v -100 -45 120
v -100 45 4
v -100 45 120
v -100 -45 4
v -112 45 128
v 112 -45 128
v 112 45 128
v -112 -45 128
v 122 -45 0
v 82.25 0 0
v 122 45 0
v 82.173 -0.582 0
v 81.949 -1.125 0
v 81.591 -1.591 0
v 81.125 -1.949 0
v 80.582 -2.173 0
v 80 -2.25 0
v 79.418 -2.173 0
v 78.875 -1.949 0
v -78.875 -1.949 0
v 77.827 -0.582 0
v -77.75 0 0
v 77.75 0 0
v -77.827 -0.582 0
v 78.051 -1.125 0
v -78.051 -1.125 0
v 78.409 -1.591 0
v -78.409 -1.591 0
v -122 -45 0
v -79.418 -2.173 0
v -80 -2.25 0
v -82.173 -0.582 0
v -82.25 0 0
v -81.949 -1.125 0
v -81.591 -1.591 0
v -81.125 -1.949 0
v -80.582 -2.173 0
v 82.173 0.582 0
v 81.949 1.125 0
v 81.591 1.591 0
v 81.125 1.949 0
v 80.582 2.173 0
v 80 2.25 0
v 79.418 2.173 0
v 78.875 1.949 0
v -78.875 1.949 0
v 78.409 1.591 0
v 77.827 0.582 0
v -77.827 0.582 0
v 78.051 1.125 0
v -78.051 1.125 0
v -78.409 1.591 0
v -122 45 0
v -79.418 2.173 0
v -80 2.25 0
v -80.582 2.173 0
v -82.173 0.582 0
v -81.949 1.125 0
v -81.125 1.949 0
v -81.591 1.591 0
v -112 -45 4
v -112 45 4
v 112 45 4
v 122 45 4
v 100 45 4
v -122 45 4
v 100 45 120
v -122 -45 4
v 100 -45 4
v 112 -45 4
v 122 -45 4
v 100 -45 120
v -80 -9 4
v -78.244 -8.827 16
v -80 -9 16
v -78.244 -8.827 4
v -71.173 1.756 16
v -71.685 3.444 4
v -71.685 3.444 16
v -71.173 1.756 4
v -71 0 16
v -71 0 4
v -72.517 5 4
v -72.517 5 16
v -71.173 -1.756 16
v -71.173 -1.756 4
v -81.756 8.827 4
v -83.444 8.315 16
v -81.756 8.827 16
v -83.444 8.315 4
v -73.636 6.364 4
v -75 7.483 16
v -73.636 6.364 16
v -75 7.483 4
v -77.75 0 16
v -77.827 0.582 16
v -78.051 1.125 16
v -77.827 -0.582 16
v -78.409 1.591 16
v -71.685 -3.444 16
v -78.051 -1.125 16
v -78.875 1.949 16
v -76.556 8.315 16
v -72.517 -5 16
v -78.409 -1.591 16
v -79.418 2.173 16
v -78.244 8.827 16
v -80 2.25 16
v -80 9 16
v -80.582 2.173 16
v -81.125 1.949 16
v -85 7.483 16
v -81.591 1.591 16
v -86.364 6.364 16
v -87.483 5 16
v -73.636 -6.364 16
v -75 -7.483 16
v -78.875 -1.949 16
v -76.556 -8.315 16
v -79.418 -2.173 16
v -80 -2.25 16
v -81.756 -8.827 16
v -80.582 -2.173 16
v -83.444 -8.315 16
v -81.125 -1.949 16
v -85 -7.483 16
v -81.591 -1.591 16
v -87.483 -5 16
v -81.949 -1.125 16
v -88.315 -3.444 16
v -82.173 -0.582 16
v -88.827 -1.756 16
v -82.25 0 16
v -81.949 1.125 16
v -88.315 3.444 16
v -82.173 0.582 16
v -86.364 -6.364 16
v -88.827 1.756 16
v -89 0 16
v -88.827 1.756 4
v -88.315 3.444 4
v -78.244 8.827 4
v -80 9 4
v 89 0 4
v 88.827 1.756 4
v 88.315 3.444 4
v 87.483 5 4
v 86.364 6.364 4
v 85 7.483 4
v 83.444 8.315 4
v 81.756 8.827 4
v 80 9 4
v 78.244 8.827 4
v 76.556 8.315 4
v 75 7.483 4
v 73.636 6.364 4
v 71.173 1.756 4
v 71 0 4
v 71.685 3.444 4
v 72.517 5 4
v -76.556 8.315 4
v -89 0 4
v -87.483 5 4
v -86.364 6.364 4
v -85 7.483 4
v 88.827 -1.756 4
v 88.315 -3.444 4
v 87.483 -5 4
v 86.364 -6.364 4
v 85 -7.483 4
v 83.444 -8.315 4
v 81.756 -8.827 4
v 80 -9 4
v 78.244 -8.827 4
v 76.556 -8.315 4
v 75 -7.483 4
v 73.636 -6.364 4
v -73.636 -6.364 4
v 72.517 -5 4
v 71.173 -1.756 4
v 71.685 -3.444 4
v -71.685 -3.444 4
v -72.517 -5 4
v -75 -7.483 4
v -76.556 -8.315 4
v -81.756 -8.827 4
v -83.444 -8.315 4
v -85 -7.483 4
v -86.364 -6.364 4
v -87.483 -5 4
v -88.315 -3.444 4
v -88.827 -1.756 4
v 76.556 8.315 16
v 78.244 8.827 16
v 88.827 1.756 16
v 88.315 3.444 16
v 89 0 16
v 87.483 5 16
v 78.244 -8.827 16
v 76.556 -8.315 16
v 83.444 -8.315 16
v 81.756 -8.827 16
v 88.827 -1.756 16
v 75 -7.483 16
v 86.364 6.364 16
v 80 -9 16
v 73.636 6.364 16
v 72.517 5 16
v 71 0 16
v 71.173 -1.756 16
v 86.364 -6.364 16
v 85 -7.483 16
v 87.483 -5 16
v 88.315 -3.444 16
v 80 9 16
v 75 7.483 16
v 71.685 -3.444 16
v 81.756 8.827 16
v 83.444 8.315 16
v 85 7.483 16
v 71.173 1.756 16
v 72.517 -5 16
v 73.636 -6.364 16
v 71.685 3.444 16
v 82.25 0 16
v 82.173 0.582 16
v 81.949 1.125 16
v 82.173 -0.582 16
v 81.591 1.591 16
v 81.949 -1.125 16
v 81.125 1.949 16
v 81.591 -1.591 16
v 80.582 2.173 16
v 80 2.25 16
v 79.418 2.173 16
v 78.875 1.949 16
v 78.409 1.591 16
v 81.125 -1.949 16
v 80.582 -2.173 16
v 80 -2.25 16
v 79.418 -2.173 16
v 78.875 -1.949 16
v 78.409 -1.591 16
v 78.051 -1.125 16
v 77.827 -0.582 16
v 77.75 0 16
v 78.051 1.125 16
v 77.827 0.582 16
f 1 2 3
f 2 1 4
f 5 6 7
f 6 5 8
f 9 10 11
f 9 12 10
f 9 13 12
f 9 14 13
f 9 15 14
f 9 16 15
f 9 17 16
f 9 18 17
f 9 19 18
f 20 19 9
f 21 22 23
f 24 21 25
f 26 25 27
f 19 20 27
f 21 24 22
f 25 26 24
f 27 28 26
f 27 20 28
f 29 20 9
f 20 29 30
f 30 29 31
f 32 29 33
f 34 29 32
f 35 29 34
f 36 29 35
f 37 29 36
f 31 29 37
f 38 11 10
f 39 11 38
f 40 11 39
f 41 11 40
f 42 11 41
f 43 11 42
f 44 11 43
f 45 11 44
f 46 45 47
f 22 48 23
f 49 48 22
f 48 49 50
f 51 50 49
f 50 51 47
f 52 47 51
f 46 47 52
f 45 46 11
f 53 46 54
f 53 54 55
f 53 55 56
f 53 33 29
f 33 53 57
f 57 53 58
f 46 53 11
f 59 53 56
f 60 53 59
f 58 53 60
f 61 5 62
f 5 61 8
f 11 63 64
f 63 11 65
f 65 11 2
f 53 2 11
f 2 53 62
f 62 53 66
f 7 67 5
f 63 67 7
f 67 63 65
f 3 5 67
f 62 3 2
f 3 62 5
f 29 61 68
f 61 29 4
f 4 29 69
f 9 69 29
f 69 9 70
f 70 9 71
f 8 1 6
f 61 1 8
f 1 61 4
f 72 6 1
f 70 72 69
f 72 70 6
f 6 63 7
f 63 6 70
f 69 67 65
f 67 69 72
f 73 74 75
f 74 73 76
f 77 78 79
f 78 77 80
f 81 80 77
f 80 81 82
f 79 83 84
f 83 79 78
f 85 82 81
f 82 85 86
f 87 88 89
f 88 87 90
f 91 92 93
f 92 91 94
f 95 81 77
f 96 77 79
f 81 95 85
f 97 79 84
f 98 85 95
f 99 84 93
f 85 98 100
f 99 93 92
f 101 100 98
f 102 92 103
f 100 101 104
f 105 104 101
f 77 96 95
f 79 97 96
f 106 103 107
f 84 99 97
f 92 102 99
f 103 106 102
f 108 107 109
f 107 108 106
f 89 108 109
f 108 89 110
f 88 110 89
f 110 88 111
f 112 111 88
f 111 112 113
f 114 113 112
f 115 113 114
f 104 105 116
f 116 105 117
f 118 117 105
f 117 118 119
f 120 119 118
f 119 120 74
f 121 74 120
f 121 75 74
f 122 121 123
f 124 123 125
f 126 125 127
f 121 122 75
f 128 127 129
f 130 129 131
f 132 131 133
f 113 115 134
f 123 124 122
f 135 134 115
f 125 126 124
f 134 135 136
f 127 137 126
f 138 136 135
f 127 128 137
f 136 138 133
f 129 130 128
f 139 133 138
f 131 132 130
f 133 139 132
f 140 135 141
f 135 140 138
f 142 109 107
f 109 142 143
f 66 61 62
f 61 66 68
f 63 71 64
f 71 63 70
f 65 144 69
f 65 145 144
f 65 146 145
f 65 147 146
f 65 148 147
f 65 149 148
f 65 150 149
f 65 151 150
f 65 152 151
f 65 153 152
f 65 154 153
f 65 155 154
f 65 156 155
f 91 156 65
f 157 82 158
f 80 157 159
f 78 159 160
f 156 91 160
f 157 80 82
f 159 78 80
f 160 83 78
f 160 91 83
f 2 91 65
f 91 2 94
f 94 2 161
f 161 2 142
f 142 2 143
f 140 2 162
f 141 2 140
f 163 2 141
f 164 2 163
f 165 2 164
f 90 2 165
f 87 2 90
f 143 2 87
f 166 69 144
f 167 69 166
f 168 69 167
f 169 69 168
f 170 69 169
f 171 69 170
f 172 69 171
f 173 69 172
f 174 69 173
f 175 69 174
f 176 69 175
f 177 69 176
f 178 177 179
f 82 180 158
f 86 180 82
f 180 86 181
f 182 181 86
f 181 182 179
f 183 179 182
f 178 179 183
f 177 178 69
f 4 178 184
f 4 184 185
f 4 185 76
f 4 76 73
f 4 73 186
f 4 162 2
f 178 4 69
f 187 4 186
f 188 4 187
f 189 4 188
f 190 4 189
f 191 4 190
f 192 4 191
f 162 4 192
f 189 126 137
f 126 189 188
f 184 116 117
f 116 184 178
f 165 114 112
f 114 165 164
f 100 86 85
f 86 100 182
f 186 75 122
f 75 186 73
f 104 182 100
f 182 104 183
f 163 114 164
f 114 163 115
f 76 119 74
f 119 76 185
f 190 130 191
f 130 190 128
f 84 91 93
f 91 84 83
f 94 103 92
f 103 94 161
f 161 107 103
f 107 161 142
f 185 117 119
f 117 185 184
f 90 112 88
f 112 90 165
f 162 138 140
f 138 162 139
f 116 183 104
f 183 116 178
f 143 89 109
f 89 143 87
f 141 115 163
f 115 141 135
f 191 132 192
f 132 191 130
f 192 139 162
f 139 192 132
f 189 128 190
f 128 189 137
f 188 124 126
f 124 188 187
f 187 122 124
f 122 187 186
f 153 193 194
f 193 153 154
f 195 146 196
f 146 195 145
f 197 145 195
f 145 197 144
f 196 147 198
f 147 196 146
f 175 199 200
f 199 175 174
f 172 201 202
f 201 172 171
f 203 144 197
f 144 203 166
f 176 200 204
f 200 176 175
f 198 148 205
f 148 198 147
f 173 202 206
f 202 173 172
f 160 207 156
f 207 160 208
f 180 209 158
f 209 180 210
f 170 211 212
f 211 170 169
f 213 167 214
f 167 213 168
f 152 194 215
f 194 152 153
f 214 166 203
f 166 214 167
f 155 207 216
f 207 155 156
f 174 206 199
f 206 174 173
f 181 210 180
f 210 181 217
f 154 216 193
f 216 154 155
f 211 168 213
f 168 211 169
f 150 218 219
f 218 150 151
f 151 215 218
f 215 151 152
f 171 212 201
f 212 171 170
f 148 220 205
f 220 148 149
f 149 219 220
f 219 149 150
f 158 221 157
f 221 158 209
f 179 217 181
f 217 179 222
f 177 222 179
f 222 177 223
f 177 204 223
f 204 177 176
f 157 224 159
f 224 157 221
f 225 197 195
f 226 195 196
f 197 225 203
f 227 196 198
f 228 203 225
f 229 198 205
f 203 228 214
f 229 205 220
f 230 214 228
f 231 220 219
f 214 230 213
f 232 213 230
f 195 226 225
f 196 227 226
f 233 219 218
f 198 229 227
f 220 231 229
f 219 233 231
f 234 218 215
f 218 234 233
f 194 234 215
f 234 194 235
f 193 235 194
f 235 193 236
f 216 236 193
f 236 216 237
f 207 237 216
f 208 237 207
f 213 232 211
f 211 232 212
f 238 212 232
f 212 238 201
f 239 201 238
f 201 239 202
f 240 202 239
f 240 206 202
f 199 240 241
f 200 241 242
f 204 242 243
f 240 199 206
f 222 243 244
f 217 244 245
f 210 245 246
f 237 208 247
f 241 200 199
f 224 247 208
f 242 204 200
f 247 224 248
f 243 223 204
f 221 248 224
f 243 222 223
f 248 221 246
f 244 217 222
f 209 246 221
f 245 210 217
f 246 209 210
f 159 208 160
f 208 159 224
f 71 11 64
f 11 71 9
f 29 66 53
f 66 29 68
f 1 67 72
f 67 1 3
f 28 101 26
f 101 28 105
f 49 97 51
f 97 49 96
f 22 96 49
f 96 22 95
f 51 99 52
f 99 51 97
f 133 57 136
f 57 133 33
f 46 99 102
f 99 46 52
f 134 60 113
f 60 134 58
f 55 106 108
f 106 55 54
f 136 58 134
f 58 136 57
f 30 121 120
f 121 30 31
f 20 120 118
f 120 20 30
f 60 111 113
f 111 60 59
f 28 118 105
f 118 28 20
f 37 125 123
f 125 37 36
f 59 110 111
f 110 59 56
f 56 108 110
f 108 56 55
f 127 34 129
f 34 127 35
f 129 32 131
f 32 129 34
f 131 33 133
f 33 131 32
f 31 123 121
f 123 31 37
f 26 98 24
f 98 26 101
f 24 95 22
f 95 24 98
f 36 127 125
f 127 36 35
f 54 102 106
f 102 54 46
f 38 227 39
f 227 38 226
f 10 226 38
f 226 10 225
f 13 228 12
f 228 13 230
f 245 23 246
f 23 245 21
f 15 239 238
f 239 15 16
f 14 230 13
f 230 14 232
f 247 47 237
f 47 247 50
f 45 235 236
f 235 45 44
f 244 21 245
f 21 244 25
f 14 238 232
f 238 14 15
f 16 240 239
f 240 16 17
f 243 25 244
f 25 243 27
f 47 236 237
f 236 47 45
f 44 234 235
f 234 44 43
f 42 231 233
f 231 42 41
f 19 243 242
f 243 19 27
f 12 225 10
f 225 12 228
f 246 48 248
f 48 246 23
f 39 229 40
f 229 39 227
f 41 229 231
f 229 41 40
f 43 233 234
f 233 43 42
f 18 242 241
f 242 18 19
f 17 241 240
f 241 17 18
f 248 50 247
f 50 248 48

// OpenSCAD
clear_width=200; clear_height=120; roof_width=220; roof_depth=90; post=12; base_thickness=4; mount_hole_diameter=4.5;
module over_under_bridge(){ difference(){ union(){ translate([-122,-roof_depth/2,0]) cube([244,roof_depth,base_thickness]); for(x=[-clear_width/2-post,clear_width/2]) translate([x,-roof_depth/2,0]) cube([post,roof_depth,clear_height+8]); translate([-roof_width/2,-roof_depth/2,clear_height]) cube([roof_width,roof_depth,8]); for(x=[-80,80]) translate([x,0,base_thickness]) cylinder(d=18,h=12,$fn=32); } for(x=[-80,80]) translate([x,0,-1]) cylinder(d=mount_hole_diameter,h=18,$fn=24); }}
assert(clear_width==200 && clear_height==120 && roof_width==220); echo("SCADCTL_REQUIREMENT:parameters:PASS"); over_under_bridge();
